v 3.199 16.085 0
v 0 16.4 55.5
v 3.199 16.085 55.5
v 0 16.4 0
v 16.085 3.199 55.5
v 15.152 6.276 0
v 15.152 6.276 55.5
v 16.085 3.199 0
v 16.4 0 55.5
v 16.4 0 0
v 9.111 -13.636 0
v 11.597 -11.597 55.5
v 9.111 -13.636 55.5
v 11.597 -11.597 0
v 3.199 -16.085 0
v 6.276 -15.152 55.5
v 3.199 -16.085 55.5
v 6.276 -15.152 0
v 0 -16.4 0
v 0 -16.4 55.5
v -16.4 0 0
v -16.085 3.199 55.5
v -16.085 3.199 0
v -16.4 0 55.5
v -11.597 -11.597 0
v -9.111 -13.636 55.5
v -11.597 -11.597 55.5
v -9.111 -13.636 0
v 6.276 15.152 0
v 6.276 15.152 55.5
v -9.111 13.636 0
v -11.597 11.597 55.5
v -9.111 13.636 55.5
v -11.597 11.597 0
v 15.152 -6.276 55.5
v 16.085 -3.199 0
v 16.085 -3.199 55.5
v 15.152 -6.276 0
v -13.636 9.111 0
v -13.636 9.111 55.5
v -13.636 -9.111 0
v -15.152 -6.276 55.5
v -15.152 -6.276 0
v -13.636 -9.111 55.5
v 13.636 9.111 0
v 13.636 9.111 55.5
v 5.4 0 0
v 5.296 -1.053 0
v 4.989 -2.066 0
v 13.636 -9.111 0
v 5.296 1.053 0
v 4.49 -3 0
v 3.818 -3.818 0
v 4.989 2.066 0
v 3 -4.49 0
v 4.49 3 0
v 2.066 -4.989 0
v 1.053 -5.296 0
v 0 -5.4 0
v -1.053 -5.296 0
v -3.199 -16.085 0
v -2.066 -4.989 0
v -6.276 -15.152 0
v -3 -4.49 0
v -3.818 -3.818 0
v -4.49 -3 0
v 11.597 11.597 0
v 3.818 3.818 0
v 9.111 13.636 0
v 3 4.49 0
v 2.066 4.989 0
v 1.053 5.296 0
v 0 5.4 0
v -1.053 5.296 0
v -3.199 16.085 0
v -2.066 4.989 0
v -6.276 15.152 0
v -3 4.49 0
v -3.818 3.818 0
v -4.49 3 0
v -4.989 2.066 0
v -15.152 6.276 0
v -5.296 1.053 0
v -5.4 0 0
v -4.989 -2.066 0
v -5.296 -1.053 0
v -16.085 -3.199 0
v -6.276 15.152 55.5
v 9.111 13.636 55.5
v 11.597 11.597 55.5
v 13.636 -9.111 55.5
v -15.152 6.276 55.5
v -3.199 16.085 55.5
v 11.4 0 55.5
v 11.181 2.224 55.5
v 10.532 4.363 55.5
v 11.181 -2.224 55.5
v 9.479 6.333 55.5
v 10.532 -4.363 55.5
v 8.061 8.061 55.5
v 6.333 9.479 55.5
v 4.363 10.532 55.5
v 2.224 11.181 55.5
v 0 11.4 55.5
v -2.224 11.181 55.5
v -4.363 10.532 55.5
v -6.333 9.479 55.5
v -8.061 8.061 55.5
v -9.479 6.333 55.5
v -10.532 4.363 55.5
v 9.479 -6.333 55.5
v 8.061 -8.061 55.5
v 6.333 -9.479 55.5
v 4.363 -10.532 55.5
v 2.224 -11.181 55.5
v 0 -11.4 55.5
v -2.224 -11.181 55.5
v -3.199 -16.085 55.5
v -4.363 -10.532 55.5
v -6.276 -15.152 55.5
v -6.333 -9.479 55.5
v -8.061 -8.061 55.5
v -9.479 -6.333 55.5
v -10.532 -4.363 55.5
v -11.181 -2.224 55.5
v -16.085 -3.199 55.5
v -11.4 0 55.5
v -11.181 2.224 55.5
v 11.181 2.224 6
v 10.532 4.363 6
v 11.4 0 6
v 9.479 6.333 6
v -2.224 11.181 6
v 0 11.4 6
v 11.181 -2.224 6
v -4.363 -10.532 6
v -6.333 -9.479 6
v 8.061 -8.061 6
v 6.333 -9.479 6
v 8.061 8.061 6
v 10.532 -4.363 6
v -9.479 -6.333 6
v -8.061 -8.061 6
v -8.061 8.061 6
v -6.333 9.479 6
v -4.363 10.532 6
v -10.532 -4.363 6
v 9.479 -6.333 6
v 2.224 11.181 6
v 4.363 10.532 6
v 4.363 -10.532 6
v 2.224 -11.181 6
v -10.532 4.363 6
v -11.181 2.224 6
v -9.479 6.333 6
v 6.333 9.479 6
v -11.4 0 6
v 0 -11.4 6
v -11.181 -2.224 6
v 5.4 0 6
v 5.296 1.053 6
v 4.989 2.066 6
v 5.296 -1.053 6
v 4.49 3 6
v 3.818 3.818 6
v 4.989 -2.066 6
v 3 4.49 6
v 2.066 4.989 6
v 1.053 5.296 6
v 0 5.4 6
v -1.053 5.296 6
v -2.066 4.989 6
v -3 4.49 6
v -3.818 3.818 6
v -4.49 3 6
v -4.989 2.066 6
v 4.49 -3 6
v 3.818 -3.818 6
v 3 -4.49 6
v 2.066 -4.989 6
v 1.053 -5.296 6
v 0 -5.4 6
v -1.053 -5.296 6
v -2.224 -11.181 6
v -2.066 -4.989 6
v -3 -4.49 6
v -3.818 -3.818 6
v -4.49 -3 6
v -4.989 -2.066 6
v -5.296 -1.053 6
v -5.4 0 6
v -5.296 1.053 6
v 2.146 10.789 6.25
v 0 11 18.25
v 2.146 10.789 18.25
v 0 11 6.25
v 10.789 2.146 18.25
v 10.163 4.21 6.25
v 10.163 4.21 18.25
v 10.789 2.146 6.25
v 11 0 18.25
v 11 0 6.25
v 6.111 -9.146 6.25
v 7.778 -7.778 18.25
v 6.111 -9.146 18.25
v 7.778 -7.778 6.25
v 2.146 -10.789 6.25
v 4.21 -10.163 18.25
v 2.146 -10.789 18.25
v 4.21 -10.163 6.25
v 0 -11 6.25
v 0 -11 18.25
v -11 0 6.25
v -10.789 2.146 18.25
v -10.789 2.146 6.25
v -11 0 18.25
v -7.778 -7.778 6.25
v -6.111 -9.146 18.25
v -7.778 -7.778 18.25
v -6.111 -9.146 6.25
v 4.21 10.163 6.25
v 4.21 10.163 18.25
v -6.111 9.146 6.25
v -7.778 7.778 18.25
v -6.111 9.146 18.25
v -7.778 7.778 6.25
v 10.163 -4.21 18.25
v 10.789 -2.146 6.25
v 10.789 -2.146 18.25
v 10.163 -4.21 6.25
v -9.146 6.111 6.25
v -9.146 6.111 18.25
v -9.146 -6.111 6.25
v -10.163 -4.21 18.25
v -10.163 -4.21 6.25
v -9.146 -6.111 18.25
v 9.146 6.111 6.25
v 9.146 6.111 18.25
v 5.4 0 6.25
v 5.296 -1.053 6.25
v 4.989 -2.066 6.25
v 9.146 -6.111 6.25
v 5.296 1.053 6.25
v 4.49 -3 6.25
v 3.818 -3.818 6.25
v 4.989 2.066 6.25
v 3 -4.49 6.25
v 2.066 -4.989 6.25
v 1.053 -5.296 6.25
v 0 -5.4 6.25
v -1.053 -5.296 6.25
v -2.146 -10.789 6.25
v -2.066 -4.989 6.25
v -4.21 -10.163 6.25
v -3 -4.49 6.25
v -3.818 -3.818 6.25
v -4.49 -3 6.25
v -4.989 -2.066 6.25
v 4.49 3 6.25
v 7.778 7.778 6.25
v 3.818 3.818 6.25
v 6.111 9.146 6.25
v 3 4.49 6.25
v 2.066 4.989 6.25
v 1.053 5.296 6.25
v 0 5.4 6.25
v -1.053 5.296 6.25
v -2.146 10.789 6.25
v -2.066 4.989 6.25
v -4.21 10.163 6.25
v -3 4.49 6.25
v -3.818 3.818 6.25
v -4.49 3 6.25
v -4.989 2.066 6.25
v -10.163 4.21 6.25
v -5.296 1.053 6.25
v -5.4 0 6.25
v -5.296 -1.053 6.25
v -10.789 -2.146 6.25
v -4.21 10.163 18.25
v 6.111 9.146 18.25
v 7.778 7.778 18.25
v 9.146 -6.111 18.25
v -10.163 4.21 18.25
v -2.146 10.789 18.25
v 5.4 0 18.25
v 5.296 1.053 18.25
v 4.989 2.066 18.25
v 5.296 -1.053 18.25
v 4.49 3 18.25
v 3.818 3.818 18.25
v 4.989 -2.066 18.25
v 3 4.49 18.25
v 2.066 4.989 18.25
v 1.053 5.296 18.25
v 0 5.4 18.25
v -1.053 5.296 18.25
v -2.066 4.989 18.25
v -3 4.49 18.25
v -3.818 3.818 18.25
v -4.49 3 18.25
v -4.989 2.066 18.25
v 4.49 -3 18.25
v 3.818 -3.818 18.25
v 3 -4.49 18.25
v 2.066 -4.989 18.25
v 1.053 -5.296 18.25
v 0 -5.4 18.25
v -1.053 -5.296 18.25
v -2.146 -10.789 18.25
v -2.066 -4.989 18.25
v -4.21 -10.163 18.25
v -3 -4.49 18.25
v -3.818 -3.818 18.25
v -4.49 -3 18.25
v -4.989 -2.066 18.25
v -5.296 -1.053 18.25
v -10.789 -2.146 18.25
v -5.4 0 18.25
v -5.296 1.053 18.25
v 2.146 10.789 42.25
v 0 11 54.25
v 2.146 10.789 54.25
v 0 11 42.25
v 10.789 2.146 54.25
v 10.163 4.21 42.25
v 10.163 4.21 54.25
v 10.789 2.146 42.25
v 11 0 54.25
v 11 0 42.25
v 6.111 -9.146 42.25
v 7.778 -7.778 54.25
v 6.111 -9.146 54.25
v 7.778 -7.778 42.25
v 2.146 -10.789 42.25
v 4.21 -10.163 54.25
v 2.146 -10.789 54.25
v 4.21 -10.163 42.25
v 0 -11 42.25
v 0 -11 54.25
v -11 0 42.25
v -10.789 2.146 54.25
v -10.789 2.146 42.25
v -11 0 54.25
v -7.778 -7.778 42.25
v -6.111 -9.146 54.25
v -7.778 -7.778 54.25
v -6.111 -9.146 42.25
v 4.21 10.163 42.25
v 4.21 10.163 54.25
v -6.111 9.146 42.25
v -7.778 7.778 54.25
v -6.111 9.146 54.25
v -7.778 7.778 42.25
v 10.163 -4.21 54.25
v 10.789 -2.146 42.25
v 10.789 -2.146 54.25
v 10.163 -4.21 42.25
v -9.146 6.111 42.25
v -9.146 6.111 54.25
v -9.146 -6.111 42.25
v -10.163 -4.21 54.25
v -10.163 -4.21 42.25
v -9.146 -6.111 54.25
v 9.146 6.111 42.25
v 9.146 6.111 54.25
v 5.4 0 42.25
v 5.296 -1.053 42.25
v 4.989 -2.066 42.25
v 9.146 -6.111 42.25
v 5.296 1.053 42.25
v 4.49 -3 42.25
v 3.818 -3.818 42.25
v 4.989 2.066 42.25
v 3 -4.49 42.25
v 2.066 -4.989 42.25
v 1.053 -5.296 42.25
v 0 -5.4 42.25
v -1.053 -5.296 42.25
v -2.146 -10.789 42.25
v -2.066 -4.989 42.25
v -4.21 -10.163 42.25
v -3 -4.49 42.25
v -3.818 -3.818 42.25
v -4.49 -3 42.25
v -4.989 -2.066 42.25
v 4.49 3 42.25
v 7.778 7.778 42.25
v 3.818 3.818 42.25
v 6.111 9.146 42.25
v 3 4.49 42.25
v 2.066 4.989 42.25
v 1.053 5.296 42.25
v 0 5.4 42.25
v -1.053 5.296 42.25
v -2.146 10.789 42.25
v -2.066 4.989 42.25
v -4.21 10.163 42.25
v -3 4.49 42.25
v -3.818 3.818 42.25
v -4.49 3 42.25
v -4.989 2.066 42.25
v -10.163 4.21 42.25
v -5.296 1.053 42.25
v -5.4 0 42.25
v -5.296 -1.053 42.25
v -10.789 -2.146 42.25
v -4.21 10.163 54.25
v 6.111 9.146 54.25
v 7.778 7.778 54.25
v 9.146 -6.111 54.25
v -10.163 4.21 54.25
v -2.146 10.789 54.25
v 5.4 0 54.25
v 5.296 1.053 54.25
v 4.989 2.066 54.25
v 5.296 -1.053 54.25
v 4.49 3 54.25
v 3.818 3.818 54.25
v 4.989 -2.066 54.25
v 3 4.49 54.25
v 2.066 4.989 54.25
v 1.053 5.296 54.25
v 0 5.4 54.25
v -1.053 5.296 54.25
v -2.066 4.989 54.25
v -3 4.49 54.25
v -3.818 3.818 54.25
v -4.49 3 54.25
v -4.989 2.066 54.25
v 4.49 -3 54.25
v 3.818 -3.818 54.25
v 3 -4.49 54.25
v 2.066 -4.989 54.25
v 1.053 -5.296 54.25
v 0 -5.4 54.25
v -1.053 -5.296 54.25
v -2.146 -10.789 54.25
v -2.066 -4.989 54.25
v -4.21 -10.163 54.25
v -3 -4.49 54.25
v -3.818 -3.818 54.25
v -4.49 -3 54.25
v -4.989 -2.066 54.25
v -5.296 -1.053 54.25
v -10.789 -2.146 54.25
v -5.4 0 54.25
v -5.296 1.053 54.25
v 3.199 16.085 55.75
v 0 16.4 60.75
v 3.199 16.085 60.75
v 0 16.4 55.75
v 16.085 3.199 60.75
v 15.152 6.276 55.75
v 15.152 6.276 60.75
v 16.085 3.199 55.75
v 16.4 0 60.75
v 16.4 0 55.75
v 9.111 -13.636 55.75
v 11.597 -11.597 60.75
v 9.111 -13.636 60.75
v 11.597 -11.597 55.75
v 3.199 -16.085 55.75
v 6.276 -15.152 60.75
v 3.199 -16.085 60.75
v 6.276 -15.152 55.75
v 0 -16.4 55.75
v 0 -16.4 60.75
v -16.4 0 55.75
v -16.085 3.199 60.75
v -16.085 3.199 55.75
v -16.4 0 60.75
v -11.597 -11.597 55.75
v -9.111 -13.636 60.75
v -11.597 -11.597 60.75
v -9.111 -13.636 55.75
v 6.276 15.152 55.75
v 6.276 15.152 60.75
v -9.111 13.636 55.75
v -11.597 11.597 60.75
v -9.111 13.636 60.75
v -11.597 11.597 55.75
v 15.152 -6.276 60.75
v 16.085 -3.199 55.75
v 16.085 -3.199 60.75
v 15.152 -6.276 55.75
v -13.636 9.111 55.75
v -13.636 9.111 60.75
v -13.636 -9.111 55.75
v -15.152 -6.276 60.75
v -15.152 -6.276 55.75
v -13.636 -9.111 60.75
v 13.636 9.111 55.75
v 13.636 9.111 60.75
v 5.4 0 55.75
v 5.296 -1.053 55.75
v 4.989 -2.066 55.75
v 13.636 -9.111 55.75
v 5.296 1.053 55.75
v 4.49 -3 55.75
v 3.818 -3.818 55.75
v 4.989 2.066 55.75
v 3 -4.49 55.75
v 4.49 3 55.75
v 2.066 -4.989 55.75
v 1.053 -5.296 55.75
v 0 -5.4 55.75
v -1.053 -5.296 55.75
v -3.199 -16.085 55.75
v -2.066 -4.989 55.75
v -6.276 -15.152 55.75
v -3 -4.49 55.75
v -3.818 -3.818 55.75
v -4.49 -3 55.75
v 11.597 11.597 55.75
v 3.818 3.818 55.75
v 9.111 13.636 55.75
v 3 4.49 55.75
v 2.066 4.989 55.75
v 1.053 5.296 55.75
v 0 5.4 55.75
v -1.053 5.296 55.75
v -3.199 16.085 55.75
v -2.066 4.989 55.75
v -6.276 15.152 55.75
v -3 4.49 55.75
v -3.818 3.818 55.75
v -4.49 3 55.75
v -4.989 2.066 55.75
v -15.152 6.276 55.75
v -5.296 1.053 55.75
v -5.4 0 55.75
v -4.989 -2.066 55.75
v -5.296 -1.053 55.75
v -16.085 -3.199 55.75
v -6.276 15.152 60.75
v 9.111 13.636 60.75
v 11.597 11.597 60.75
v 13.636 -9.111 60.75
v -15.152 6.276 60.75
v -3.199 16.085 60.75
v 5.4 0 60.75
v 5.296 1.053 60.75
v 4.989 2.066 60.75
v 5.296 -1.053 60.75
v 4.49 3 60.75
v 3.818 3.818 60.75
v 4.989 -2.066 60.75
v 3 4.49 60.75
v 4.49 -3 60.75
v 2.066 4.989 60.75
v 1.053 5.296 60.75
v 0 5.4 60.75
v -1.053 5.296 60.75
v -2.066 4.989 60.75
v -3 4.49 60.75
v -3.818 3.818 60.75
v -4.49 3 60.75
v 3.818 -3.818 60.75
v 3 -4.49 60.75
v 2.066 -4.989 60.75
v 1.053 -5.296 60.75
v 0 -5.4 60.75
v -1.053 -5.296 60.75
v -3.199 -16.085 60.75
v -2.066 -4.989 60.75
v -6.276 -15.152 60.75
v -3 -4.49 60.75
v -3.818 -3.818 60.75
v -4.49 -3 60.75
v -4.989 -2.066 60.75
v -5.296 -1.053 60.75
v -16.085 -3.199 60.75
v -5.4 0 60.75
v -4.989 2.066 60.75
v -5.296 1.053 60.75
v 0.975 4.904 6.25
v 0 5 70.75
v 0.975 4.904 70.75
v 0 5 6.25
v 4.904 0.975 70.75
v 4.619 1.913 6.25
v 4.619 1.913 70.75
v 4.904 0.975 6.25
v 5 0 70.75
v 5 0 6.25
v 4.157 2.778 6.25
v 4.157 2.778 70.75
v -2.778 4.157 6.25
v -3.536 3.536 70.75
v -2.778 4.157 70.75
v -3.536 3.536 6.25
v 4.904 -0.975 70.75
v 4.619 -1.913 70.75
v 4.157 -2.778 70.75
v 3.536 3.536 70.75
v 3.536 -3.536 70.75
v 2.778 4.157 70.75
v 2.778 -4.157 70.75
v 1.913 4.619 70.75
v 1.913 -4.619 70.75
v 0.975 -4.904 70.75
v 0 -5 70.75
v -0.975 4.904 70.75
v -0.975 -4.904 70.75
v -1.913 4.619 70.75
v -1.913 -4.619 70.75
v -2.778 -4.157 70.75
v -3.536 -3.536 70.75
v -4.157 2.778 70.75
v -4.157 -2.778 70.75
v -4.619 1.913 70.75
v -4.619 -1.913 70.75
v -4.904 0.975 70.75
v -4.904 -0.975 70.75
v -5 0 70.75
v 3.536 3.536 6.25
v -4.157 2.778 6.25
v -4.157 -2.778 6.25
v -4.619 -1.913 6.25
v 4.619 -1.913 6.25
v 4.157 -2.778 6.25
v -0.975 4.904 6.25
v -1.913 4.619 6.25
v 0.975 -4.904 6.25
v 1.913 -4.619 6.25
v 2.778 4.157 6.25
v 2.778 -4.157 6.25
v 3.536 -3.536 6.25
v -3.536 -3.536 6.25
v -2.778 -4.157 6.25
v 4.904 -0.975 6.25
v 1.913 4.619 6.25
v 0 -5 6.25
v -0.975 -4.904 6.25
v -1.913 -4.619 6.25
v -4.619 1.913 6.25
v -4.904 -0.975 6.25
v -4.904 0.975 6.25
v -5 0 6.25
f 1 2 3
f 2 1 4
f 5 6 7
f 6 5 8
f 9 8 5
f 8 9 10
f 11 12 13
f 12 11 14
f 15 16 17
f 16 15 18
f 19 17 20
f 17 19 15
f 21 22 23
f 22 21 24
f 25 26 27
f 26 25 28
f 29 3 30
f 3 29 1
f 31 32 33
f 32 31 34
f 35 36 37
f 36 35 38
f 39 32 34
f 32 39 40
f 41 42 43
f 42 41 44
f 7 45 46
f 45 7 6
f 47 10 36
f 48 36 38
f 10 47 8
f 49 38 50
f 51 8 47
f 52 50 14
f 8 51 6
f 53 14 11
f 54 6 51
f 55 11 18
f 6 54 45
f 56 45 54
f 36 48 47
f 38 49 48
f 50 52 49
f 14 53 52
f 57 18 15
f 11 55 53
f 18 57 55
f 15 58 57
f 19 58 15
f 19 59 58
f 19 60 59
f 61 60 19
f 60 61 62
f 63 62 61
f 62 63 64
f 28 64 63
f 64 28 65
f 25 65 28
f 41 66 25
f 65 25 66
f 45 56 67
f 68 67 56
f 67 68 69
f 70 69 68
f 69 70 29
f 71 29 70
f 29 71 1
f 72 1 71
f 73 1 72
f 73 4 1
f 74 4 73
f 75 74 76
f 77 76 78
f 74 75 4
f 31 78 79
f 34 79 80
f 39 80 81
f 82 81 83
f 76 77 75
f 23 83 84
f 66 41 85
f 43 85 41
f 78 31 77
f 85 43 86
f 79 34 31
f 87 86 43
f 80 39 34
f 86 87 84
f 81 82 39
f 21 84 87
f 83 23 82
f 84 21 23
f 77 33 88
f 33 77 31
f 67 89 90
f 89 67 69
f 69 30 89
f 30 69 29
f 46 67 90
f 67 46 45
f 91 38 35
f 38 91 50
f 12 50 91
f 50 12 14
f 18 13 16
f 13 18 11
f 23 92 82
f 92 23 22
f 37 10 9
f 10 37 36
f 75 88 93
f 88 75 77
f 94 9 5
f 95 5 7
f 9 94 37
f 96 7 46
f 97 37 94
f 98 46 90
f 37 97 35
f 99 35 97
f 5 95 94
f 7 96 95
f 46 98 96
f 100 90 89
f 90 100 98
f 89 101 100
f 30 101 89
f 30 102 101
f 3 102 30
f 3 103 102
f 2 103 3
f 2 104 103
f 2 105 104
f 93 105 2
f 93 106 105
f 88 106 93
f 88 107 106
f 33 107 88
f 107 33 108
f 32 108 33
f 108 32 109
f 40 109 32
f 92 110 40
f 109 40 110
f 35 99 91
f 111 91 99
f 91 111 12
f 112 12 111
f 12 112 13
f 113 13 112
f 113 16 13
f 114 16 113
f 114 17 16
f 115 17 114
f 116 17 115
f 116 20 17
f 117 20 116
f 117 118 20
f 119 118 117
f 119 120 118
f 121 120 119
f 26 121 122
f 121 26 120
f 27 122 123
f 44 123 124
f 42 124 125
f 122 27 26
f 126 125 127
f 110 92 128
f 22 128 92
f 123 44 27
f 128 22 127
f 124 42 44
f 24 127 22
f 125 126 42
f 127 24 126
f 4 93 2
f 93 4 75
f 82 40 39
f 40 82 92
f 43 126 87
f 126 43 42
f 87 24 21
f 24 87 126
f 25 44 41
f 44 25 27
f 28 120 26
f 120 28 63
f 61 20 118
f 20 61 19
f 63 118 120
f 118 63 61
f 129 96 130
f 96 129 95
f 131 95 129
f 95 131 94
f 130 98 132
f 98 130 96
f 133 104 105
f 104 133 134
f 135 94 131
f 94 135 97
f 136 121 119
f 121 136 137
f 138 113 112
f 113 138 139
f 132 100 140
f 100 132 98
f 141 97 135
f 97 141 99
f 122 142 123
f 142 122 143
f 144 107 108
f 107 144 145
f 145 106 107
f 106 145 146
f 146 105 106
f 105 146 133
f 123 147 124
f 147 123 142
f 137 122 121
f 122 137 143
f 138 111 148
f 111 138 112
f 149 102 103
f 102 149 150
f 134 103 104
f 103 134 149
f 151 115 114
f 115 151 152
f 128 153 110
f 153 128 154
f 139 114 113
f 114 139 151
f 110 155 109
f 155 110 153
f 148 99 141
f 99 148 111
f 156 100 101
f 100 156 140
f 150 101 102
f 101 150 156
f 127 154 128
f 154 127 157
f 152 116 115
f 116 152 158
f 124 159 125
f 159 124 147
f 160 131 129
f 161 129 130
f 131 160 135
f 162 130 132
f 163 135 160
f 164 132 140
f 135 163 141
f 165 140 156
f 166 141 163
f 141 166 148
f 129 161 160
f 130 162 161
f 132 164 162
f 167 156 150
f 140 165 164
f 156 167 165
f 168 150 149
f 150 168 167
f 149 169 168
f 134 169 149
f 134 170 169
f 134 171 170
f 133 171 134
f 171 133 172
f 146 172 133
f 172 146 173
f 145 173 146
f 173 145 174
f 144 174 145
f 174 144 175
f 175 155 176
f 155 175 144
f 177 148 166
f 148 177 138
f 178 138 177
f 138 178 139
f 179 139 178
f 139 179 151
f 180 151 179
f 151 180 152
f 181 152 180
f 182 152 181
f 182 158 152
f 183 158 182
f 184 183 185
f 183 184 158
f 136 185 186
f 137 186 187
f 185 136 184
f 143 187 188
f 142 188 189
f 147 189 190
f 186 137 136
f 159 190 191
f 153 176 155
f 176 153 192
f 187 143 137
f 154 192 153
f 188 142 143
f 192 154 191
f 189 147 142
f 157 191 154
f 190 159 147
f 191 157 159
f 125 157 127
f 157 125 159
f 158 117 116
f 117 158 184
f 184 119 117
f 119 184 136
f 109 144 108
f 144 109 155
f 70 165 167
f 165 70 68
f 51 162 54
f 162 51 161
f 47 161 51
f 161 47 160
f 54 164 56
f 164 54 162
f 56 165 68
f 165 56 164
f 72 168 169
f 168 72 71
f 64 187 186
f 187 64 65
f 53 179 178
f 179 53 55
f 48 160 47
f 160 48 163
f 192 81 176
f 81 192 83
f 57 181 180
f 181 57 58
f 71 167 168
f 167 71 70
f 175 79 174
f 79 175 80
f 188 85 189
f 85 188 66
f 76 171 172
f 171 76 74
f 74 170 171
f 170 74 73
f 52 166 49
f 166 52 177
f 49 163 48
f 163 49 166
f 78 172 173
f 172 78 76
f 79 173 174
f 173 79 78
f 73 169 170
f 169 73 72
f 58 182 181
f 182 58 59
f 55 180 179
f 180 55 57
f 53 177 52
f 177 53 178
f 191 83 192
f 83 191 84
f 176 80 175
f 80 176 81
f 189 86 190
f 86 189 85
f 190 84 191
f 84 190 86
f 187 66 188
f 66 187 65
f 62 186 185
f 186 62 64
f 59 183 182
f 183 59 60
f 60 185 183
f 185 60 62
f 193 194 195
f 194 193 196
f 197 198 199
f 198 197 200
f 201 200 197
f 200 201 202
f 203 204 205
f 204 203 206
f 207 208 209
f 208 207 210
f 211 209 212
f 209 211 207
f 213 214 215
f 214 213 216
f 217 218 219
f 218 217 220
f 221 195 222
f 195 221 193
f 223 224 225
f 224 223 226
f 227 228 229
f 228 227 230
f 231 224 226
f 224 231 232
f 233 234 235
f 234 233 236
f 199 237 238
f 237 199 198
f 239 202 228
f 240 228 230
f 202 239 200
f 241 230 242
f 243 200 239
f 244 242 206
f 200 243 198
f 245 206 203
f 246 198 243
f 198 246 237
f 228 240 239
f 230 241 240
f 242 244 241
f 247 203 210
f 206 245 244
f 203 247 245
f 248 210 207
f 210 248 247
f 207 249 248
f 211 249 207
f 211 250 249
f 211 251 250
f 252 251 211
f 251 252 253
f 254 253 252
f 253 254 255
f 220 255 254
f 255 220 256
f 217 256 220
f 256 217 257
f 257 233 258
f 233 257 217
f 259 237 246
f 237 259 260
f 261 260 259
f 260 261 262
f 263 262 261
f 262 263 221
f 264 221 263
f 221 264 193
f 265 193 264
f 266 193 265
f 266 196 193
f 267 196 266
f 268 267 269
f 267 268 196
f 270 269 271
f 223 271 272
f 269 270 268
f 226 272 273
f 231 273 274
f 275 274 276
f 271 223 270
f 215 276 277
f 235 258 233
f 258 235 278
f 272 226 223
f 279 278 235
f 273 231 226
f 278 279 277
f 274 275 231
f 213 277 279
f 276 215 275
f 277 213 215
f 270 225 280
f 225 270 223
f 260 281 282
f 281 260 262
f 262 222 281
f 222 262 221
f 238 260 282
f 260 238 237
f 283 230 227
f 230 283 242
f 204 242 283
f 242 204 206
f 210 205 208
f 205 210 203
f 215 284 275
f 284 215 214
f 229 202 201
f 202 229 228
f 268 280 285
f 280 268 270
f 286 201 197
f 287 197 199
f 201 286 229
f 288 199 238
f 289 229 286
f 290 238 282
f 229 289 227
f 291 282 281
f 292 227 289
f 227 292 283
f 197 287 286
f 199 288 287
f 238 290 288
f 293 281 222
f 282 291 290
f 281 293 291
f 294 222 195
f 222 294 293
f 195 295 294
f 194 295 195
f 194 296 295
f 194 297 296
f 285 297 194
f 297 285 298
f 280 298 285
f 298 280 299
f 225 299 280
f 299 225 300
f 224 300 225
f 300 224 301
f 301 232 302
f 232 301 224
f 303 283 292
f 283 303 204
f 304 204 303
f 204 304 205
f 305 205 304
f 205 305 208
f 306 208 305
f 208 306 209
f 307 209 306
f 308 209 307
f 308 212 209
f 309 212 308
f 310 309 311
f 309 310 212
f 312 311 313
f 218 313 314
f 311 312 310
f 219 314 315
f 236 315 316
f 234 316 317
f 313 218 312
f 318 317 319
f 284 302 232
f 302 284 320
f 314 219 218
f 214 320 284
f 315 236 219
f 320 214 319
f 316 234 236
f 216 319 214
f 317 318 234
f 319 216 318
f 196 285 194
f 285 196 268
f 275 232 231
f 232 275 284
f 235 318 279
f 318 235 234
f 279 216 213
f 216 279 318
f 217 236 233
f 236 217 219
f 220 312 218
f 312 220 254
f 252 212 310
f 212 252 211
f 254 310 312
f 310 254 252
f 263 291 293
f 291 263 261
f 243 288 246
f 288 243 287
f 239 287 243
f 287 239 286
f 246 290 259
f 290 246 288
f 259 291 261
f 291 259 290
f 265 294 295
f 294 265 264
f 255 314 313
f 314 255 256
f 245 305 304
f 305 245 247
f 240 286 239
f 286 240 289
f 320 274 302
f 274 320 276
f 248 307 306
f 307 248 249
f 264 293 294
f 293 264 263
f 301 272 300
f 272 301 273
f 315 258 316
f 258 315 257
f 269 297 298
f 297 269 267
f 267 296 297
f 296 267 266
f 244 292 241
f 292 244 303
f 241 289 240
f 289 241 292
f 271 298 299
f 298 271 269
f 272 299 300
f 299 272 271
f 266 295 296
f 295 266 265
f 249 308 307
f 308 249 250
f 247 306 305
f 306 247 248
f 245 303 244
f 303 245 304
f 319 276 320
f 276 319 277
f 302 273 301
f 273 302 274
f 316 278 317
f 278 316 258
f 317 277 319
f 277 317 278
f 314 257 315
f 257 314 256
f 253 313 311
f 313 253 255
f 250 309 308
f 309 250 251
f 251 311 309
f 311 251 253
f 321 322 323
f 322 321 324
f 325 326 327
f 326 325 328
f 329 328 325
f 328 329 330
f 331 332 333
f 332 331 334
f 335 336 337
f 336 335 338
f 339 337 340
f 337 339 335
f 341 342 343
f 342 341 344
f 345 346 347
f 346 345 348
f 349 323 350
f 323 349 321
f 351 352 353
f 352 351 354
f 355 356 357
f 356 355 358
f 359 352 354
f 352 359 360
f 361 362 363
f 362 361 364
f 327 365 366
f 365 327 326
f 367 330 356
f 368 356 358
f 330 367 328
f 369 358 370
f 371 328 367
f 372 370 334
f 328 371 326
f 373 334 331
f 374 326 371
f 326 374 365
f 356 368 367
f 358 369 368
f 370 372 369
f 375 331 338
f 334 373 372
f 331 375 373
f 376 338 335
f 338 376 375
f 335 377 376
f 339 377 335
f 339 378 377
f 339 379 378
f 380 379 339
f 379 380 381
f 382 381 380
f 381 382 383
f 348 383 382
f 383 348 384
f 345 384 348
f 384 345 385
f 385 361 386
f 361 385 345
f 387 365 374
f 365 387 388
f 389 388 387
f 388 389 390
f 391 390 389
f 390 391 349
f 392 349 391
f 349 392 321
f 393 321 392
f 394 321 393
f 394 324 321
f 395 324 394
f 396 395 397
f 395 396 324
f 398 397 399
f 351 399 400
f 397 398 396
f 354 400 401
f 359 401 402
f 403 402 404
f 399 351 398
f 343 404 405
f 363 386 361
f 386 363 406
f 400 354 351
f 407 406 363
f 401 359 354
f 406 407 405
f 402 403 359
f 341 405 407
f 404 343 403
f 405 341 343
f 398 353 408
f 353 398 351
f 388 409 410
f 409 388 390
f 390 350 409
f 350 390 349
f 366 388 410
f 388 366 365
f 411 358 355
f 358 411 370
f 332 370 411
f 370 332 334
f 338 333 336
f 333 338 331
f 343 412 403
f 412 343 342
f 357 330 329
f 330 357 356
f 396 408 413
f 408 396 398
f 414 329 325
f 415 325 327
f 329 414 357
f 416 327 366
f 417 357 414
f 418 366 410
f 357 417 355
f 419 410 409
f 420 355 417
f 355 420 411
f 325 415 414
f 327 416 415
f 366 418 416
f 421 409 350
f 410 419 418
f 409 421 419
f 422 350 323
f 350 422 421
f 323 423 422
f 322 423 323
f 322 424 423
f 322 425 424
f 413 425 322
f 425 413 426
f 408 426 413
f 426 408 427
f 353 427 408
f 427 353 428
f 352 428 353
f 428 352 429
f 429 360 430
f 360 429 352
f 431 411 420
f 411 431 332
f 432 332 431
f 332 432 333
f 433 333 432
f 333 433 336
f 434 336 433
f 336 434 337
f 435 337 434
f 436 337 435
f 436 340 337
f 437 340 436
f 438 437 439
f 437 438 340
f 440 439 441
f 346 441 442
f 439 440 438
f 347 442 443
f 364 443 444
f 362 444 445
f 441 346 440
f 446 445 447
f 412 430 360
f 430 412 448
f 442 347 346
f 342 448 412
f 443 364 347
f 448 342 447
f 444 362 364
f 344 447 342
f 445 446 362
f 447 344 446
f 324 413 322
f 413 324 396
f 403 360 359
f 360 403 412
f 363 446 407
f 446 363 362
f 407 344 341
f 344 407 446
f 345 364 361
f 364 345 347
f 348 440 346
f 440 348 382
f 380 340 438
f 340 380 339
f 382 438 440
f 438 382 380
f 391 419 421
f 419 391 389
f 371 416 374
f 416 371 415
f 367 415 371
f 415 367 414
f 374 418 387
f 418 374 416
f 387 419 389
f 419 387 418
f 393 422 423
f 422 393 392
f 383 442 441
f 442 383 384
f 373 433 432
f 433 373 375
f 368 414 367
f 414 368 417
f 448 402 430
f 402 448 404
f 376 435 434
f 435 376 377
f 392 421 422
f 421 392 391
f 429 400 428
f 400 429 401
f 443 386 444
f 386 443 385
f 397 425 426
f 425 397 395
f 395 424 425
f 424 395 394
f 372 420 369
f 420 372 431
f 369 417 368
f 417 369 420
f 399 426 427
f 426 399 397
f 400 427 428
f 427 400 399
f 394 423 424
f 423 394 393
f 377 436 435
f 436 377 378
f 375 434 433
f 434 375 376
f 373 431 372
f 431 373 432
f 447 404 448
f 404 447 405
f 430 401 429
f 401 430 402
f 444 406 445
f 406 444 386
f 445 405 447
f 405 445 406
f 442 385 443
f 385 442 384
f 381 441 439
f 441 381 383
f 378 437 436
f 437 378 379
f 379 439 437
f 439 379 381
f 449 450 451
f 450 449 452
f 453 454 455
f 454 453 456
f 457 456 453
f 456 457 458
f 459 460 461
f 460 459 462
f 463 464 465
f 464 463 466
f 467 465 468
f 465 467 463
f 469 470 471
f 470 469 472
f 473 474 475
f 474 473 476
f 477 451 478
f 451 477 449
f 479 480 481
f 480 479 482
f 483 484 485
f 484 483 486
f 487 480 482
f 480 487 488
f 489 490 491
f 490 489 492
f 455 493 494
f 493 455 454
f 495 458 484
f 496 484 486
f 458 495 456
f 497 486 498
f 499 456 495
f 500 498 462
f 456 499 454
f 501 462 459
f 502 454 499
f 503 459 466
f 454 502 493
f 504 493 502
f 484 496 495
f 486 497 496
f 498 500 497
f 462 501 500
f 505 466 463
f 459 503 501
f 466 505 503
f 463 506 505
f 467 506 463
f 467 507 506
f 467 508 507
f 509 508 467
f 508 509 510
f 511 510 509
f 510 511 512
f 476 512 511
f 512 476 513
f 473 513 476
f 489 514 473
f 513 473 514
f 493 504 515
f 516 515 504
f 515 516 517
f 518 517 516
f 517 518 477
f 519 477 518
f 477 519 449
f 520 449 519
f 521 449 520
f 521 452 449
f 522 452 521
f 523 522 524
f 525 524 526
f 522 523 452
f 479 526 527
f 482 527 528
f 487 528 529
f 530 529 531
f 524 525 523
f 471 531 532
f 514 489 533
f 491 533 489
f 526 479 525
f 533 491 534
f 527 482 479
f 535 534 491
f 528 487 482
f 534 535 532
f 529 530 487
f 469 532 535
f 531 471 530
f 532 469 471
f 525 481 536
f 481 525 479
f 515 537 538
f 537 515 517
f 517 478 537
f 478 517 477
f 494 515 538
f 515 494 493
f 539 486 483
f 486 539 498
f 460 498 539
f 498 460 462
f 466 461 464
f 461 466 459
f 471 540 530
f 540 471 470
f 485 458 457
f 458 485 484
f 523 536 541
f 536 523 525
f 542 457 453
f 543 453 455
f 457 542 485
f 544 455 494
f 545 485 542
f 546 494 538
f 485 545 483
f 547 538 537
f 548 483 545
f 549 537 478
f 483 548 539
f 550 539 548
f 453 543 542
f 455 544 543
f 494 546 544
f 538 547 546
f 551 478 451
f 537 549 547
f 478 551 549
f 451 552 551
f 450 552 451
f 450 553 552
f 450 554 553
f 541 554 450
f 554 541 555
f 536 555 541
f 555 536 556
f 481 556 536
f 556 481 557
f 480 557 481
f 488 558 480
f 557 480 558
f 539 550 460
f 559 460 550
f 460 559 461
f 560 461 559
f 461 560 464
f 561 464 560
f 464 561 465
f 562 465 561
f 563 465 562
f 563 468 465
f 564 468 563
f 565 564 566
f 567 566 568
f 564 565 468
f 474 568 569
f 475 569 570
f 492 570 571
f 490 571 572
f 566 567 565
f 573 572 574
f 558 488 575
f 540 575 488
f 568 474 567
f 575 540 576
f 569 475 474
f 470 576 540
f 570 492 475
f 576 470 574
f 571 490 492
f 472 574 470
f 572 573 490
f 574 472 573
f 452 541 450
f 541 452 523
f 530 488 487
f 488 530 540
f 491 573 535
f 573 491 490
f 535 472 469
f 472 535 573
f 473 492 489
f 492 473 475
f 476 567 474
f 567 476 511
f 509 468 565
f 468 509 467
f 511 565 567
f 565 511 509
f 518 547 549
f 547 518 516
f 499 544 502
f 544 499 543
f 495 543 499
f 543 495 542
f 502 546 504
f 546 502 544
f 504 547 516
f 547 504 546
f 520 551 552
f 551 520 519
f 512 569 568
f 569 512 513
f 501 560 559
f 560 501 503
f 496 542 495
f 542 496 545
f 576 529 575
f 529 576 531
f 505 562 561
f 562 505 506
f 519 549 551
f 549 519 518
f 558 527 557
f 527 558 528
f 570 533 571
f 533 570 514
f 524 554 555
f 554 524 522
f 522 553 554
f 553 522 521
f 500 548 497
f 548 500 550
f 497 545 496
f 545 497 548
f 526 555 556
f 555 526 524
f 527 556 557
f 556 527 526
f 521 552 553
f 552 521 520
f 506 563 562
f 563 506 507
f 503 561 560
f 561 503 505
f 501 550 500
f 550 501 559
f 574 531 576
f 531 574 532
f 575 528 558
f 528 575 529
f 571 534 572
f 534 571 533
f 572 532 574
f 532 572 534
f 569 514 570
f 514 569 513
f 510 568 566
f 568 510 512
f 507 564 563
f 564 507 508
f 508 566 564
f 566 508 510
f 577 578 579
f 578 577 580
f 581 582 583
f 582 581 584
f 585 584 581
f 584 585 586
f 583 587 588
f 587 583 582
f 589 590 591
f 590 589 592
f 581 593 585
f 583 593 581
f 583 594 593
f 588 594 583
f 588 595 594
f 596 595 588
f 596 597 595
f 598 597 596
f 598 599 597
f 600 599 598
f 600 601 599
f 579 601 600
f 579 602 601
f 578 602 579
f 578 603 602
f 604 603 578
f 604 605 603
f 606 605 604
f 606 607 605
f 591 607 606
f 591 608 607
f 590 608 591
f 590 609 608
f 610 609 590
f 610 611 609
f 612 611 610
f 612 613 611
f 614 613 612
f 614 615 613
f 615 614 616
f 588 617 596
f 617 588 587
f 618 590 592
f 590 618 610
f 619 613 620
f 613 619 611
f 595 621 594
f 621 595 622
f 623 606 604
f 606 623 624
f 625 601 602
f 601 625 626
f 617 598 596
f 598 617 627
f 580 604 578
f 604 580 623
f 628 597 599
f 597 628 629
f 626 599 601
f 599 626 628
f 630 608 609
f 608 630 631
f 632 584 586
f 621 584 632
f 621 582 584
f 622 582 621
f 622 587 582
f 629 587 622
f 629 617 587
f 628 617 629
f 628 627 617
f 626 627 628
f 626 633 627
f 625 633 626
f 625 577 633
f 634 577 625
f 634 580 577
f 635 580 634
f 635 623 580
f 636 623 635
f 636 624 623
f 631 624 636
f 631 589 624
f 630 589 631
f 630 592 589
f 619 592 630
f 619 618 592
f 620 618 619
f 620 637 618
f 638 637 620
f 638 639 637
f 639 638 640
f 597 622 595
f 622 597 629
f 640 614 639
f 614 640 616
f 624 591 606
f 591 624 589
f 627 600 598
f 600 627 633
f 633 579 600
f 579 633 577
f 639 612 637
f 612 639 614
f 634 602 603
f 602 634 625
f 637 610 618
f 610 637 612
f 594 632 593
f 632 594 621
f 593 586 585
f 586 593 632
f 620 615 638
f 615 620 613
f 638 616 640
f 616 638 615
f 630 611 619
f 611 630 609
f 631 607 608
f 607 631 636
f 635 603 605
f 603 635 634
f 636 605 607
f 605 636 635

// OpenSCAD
$fn = 32;

// ------------------------------------------------------------------------
// Shaft station: cup d32.8 x 55.5 mm, shaft d10
// Every part is its own module, assembly() places every instance.
// ------------------------------------------------------------------------

// --- part 1 ---
module housing_cup() {
  difference() {
    cylinder(h = 55.5, d = 32.8);
    translate([0, 0, 6]) cylinder(h = 50.5, d = 22.8);
    translate([0, 0, -1]) cylinder(h = 8, d = 10.8);
  }
}

// --- part 2 ---
module bearing_lower() {
  difference() {
      translate([0, 0, 0]) cylinder(h = 12, d = 22);
      translate([0, 0, -1]) cylinder(h = 14, d = 10.8);
    }
}

// --- part 3 ---
module bearing_upper() {
  difference() {
      translate([0, 0, 0]) cylinder(h = 12, d = 22);
      translate([0, 0, -1]) cylinder(h = 14, d = 10.8);
    }
}

// --- part 4 ---
module station_shaft() {
  translate([0, 0, -32.25]) cylinder(h = 64.5, d = 10);
}

// --- part 5 ---
module station_cover() {
  difference() {
    cylinder(h = 5, d = 32.8);
    translate([0, 0, -1]) cylinder(h = 7, d = 10.8);
  }
}

// --- assembly ---
module assembly() {
  color([0.80, 0.24, 0.20]) translate([0, 0, 0]) rotate([0, 0, 0]) housing_cup();
  color([0.20, 0.45, 0.75]) translate([0, 0, 6.25]) rotate([0, 0, 0]) bearing_lower();
  color([0.25, 0.62, 0.32]) translate([0, 0, 42.25]) rotate([0, 0, 0]) bearing_upper();
  color([0.92, 0.70, 0.18]) translate([0, 0, 38.5]) rotate([0, 0, 0]) station_shaft();
  color([0.58, 0.35, 0.70]) translate([0, 0, 55.75]) rotate([0, 0, 0]) station_cover();
}

assembly();
